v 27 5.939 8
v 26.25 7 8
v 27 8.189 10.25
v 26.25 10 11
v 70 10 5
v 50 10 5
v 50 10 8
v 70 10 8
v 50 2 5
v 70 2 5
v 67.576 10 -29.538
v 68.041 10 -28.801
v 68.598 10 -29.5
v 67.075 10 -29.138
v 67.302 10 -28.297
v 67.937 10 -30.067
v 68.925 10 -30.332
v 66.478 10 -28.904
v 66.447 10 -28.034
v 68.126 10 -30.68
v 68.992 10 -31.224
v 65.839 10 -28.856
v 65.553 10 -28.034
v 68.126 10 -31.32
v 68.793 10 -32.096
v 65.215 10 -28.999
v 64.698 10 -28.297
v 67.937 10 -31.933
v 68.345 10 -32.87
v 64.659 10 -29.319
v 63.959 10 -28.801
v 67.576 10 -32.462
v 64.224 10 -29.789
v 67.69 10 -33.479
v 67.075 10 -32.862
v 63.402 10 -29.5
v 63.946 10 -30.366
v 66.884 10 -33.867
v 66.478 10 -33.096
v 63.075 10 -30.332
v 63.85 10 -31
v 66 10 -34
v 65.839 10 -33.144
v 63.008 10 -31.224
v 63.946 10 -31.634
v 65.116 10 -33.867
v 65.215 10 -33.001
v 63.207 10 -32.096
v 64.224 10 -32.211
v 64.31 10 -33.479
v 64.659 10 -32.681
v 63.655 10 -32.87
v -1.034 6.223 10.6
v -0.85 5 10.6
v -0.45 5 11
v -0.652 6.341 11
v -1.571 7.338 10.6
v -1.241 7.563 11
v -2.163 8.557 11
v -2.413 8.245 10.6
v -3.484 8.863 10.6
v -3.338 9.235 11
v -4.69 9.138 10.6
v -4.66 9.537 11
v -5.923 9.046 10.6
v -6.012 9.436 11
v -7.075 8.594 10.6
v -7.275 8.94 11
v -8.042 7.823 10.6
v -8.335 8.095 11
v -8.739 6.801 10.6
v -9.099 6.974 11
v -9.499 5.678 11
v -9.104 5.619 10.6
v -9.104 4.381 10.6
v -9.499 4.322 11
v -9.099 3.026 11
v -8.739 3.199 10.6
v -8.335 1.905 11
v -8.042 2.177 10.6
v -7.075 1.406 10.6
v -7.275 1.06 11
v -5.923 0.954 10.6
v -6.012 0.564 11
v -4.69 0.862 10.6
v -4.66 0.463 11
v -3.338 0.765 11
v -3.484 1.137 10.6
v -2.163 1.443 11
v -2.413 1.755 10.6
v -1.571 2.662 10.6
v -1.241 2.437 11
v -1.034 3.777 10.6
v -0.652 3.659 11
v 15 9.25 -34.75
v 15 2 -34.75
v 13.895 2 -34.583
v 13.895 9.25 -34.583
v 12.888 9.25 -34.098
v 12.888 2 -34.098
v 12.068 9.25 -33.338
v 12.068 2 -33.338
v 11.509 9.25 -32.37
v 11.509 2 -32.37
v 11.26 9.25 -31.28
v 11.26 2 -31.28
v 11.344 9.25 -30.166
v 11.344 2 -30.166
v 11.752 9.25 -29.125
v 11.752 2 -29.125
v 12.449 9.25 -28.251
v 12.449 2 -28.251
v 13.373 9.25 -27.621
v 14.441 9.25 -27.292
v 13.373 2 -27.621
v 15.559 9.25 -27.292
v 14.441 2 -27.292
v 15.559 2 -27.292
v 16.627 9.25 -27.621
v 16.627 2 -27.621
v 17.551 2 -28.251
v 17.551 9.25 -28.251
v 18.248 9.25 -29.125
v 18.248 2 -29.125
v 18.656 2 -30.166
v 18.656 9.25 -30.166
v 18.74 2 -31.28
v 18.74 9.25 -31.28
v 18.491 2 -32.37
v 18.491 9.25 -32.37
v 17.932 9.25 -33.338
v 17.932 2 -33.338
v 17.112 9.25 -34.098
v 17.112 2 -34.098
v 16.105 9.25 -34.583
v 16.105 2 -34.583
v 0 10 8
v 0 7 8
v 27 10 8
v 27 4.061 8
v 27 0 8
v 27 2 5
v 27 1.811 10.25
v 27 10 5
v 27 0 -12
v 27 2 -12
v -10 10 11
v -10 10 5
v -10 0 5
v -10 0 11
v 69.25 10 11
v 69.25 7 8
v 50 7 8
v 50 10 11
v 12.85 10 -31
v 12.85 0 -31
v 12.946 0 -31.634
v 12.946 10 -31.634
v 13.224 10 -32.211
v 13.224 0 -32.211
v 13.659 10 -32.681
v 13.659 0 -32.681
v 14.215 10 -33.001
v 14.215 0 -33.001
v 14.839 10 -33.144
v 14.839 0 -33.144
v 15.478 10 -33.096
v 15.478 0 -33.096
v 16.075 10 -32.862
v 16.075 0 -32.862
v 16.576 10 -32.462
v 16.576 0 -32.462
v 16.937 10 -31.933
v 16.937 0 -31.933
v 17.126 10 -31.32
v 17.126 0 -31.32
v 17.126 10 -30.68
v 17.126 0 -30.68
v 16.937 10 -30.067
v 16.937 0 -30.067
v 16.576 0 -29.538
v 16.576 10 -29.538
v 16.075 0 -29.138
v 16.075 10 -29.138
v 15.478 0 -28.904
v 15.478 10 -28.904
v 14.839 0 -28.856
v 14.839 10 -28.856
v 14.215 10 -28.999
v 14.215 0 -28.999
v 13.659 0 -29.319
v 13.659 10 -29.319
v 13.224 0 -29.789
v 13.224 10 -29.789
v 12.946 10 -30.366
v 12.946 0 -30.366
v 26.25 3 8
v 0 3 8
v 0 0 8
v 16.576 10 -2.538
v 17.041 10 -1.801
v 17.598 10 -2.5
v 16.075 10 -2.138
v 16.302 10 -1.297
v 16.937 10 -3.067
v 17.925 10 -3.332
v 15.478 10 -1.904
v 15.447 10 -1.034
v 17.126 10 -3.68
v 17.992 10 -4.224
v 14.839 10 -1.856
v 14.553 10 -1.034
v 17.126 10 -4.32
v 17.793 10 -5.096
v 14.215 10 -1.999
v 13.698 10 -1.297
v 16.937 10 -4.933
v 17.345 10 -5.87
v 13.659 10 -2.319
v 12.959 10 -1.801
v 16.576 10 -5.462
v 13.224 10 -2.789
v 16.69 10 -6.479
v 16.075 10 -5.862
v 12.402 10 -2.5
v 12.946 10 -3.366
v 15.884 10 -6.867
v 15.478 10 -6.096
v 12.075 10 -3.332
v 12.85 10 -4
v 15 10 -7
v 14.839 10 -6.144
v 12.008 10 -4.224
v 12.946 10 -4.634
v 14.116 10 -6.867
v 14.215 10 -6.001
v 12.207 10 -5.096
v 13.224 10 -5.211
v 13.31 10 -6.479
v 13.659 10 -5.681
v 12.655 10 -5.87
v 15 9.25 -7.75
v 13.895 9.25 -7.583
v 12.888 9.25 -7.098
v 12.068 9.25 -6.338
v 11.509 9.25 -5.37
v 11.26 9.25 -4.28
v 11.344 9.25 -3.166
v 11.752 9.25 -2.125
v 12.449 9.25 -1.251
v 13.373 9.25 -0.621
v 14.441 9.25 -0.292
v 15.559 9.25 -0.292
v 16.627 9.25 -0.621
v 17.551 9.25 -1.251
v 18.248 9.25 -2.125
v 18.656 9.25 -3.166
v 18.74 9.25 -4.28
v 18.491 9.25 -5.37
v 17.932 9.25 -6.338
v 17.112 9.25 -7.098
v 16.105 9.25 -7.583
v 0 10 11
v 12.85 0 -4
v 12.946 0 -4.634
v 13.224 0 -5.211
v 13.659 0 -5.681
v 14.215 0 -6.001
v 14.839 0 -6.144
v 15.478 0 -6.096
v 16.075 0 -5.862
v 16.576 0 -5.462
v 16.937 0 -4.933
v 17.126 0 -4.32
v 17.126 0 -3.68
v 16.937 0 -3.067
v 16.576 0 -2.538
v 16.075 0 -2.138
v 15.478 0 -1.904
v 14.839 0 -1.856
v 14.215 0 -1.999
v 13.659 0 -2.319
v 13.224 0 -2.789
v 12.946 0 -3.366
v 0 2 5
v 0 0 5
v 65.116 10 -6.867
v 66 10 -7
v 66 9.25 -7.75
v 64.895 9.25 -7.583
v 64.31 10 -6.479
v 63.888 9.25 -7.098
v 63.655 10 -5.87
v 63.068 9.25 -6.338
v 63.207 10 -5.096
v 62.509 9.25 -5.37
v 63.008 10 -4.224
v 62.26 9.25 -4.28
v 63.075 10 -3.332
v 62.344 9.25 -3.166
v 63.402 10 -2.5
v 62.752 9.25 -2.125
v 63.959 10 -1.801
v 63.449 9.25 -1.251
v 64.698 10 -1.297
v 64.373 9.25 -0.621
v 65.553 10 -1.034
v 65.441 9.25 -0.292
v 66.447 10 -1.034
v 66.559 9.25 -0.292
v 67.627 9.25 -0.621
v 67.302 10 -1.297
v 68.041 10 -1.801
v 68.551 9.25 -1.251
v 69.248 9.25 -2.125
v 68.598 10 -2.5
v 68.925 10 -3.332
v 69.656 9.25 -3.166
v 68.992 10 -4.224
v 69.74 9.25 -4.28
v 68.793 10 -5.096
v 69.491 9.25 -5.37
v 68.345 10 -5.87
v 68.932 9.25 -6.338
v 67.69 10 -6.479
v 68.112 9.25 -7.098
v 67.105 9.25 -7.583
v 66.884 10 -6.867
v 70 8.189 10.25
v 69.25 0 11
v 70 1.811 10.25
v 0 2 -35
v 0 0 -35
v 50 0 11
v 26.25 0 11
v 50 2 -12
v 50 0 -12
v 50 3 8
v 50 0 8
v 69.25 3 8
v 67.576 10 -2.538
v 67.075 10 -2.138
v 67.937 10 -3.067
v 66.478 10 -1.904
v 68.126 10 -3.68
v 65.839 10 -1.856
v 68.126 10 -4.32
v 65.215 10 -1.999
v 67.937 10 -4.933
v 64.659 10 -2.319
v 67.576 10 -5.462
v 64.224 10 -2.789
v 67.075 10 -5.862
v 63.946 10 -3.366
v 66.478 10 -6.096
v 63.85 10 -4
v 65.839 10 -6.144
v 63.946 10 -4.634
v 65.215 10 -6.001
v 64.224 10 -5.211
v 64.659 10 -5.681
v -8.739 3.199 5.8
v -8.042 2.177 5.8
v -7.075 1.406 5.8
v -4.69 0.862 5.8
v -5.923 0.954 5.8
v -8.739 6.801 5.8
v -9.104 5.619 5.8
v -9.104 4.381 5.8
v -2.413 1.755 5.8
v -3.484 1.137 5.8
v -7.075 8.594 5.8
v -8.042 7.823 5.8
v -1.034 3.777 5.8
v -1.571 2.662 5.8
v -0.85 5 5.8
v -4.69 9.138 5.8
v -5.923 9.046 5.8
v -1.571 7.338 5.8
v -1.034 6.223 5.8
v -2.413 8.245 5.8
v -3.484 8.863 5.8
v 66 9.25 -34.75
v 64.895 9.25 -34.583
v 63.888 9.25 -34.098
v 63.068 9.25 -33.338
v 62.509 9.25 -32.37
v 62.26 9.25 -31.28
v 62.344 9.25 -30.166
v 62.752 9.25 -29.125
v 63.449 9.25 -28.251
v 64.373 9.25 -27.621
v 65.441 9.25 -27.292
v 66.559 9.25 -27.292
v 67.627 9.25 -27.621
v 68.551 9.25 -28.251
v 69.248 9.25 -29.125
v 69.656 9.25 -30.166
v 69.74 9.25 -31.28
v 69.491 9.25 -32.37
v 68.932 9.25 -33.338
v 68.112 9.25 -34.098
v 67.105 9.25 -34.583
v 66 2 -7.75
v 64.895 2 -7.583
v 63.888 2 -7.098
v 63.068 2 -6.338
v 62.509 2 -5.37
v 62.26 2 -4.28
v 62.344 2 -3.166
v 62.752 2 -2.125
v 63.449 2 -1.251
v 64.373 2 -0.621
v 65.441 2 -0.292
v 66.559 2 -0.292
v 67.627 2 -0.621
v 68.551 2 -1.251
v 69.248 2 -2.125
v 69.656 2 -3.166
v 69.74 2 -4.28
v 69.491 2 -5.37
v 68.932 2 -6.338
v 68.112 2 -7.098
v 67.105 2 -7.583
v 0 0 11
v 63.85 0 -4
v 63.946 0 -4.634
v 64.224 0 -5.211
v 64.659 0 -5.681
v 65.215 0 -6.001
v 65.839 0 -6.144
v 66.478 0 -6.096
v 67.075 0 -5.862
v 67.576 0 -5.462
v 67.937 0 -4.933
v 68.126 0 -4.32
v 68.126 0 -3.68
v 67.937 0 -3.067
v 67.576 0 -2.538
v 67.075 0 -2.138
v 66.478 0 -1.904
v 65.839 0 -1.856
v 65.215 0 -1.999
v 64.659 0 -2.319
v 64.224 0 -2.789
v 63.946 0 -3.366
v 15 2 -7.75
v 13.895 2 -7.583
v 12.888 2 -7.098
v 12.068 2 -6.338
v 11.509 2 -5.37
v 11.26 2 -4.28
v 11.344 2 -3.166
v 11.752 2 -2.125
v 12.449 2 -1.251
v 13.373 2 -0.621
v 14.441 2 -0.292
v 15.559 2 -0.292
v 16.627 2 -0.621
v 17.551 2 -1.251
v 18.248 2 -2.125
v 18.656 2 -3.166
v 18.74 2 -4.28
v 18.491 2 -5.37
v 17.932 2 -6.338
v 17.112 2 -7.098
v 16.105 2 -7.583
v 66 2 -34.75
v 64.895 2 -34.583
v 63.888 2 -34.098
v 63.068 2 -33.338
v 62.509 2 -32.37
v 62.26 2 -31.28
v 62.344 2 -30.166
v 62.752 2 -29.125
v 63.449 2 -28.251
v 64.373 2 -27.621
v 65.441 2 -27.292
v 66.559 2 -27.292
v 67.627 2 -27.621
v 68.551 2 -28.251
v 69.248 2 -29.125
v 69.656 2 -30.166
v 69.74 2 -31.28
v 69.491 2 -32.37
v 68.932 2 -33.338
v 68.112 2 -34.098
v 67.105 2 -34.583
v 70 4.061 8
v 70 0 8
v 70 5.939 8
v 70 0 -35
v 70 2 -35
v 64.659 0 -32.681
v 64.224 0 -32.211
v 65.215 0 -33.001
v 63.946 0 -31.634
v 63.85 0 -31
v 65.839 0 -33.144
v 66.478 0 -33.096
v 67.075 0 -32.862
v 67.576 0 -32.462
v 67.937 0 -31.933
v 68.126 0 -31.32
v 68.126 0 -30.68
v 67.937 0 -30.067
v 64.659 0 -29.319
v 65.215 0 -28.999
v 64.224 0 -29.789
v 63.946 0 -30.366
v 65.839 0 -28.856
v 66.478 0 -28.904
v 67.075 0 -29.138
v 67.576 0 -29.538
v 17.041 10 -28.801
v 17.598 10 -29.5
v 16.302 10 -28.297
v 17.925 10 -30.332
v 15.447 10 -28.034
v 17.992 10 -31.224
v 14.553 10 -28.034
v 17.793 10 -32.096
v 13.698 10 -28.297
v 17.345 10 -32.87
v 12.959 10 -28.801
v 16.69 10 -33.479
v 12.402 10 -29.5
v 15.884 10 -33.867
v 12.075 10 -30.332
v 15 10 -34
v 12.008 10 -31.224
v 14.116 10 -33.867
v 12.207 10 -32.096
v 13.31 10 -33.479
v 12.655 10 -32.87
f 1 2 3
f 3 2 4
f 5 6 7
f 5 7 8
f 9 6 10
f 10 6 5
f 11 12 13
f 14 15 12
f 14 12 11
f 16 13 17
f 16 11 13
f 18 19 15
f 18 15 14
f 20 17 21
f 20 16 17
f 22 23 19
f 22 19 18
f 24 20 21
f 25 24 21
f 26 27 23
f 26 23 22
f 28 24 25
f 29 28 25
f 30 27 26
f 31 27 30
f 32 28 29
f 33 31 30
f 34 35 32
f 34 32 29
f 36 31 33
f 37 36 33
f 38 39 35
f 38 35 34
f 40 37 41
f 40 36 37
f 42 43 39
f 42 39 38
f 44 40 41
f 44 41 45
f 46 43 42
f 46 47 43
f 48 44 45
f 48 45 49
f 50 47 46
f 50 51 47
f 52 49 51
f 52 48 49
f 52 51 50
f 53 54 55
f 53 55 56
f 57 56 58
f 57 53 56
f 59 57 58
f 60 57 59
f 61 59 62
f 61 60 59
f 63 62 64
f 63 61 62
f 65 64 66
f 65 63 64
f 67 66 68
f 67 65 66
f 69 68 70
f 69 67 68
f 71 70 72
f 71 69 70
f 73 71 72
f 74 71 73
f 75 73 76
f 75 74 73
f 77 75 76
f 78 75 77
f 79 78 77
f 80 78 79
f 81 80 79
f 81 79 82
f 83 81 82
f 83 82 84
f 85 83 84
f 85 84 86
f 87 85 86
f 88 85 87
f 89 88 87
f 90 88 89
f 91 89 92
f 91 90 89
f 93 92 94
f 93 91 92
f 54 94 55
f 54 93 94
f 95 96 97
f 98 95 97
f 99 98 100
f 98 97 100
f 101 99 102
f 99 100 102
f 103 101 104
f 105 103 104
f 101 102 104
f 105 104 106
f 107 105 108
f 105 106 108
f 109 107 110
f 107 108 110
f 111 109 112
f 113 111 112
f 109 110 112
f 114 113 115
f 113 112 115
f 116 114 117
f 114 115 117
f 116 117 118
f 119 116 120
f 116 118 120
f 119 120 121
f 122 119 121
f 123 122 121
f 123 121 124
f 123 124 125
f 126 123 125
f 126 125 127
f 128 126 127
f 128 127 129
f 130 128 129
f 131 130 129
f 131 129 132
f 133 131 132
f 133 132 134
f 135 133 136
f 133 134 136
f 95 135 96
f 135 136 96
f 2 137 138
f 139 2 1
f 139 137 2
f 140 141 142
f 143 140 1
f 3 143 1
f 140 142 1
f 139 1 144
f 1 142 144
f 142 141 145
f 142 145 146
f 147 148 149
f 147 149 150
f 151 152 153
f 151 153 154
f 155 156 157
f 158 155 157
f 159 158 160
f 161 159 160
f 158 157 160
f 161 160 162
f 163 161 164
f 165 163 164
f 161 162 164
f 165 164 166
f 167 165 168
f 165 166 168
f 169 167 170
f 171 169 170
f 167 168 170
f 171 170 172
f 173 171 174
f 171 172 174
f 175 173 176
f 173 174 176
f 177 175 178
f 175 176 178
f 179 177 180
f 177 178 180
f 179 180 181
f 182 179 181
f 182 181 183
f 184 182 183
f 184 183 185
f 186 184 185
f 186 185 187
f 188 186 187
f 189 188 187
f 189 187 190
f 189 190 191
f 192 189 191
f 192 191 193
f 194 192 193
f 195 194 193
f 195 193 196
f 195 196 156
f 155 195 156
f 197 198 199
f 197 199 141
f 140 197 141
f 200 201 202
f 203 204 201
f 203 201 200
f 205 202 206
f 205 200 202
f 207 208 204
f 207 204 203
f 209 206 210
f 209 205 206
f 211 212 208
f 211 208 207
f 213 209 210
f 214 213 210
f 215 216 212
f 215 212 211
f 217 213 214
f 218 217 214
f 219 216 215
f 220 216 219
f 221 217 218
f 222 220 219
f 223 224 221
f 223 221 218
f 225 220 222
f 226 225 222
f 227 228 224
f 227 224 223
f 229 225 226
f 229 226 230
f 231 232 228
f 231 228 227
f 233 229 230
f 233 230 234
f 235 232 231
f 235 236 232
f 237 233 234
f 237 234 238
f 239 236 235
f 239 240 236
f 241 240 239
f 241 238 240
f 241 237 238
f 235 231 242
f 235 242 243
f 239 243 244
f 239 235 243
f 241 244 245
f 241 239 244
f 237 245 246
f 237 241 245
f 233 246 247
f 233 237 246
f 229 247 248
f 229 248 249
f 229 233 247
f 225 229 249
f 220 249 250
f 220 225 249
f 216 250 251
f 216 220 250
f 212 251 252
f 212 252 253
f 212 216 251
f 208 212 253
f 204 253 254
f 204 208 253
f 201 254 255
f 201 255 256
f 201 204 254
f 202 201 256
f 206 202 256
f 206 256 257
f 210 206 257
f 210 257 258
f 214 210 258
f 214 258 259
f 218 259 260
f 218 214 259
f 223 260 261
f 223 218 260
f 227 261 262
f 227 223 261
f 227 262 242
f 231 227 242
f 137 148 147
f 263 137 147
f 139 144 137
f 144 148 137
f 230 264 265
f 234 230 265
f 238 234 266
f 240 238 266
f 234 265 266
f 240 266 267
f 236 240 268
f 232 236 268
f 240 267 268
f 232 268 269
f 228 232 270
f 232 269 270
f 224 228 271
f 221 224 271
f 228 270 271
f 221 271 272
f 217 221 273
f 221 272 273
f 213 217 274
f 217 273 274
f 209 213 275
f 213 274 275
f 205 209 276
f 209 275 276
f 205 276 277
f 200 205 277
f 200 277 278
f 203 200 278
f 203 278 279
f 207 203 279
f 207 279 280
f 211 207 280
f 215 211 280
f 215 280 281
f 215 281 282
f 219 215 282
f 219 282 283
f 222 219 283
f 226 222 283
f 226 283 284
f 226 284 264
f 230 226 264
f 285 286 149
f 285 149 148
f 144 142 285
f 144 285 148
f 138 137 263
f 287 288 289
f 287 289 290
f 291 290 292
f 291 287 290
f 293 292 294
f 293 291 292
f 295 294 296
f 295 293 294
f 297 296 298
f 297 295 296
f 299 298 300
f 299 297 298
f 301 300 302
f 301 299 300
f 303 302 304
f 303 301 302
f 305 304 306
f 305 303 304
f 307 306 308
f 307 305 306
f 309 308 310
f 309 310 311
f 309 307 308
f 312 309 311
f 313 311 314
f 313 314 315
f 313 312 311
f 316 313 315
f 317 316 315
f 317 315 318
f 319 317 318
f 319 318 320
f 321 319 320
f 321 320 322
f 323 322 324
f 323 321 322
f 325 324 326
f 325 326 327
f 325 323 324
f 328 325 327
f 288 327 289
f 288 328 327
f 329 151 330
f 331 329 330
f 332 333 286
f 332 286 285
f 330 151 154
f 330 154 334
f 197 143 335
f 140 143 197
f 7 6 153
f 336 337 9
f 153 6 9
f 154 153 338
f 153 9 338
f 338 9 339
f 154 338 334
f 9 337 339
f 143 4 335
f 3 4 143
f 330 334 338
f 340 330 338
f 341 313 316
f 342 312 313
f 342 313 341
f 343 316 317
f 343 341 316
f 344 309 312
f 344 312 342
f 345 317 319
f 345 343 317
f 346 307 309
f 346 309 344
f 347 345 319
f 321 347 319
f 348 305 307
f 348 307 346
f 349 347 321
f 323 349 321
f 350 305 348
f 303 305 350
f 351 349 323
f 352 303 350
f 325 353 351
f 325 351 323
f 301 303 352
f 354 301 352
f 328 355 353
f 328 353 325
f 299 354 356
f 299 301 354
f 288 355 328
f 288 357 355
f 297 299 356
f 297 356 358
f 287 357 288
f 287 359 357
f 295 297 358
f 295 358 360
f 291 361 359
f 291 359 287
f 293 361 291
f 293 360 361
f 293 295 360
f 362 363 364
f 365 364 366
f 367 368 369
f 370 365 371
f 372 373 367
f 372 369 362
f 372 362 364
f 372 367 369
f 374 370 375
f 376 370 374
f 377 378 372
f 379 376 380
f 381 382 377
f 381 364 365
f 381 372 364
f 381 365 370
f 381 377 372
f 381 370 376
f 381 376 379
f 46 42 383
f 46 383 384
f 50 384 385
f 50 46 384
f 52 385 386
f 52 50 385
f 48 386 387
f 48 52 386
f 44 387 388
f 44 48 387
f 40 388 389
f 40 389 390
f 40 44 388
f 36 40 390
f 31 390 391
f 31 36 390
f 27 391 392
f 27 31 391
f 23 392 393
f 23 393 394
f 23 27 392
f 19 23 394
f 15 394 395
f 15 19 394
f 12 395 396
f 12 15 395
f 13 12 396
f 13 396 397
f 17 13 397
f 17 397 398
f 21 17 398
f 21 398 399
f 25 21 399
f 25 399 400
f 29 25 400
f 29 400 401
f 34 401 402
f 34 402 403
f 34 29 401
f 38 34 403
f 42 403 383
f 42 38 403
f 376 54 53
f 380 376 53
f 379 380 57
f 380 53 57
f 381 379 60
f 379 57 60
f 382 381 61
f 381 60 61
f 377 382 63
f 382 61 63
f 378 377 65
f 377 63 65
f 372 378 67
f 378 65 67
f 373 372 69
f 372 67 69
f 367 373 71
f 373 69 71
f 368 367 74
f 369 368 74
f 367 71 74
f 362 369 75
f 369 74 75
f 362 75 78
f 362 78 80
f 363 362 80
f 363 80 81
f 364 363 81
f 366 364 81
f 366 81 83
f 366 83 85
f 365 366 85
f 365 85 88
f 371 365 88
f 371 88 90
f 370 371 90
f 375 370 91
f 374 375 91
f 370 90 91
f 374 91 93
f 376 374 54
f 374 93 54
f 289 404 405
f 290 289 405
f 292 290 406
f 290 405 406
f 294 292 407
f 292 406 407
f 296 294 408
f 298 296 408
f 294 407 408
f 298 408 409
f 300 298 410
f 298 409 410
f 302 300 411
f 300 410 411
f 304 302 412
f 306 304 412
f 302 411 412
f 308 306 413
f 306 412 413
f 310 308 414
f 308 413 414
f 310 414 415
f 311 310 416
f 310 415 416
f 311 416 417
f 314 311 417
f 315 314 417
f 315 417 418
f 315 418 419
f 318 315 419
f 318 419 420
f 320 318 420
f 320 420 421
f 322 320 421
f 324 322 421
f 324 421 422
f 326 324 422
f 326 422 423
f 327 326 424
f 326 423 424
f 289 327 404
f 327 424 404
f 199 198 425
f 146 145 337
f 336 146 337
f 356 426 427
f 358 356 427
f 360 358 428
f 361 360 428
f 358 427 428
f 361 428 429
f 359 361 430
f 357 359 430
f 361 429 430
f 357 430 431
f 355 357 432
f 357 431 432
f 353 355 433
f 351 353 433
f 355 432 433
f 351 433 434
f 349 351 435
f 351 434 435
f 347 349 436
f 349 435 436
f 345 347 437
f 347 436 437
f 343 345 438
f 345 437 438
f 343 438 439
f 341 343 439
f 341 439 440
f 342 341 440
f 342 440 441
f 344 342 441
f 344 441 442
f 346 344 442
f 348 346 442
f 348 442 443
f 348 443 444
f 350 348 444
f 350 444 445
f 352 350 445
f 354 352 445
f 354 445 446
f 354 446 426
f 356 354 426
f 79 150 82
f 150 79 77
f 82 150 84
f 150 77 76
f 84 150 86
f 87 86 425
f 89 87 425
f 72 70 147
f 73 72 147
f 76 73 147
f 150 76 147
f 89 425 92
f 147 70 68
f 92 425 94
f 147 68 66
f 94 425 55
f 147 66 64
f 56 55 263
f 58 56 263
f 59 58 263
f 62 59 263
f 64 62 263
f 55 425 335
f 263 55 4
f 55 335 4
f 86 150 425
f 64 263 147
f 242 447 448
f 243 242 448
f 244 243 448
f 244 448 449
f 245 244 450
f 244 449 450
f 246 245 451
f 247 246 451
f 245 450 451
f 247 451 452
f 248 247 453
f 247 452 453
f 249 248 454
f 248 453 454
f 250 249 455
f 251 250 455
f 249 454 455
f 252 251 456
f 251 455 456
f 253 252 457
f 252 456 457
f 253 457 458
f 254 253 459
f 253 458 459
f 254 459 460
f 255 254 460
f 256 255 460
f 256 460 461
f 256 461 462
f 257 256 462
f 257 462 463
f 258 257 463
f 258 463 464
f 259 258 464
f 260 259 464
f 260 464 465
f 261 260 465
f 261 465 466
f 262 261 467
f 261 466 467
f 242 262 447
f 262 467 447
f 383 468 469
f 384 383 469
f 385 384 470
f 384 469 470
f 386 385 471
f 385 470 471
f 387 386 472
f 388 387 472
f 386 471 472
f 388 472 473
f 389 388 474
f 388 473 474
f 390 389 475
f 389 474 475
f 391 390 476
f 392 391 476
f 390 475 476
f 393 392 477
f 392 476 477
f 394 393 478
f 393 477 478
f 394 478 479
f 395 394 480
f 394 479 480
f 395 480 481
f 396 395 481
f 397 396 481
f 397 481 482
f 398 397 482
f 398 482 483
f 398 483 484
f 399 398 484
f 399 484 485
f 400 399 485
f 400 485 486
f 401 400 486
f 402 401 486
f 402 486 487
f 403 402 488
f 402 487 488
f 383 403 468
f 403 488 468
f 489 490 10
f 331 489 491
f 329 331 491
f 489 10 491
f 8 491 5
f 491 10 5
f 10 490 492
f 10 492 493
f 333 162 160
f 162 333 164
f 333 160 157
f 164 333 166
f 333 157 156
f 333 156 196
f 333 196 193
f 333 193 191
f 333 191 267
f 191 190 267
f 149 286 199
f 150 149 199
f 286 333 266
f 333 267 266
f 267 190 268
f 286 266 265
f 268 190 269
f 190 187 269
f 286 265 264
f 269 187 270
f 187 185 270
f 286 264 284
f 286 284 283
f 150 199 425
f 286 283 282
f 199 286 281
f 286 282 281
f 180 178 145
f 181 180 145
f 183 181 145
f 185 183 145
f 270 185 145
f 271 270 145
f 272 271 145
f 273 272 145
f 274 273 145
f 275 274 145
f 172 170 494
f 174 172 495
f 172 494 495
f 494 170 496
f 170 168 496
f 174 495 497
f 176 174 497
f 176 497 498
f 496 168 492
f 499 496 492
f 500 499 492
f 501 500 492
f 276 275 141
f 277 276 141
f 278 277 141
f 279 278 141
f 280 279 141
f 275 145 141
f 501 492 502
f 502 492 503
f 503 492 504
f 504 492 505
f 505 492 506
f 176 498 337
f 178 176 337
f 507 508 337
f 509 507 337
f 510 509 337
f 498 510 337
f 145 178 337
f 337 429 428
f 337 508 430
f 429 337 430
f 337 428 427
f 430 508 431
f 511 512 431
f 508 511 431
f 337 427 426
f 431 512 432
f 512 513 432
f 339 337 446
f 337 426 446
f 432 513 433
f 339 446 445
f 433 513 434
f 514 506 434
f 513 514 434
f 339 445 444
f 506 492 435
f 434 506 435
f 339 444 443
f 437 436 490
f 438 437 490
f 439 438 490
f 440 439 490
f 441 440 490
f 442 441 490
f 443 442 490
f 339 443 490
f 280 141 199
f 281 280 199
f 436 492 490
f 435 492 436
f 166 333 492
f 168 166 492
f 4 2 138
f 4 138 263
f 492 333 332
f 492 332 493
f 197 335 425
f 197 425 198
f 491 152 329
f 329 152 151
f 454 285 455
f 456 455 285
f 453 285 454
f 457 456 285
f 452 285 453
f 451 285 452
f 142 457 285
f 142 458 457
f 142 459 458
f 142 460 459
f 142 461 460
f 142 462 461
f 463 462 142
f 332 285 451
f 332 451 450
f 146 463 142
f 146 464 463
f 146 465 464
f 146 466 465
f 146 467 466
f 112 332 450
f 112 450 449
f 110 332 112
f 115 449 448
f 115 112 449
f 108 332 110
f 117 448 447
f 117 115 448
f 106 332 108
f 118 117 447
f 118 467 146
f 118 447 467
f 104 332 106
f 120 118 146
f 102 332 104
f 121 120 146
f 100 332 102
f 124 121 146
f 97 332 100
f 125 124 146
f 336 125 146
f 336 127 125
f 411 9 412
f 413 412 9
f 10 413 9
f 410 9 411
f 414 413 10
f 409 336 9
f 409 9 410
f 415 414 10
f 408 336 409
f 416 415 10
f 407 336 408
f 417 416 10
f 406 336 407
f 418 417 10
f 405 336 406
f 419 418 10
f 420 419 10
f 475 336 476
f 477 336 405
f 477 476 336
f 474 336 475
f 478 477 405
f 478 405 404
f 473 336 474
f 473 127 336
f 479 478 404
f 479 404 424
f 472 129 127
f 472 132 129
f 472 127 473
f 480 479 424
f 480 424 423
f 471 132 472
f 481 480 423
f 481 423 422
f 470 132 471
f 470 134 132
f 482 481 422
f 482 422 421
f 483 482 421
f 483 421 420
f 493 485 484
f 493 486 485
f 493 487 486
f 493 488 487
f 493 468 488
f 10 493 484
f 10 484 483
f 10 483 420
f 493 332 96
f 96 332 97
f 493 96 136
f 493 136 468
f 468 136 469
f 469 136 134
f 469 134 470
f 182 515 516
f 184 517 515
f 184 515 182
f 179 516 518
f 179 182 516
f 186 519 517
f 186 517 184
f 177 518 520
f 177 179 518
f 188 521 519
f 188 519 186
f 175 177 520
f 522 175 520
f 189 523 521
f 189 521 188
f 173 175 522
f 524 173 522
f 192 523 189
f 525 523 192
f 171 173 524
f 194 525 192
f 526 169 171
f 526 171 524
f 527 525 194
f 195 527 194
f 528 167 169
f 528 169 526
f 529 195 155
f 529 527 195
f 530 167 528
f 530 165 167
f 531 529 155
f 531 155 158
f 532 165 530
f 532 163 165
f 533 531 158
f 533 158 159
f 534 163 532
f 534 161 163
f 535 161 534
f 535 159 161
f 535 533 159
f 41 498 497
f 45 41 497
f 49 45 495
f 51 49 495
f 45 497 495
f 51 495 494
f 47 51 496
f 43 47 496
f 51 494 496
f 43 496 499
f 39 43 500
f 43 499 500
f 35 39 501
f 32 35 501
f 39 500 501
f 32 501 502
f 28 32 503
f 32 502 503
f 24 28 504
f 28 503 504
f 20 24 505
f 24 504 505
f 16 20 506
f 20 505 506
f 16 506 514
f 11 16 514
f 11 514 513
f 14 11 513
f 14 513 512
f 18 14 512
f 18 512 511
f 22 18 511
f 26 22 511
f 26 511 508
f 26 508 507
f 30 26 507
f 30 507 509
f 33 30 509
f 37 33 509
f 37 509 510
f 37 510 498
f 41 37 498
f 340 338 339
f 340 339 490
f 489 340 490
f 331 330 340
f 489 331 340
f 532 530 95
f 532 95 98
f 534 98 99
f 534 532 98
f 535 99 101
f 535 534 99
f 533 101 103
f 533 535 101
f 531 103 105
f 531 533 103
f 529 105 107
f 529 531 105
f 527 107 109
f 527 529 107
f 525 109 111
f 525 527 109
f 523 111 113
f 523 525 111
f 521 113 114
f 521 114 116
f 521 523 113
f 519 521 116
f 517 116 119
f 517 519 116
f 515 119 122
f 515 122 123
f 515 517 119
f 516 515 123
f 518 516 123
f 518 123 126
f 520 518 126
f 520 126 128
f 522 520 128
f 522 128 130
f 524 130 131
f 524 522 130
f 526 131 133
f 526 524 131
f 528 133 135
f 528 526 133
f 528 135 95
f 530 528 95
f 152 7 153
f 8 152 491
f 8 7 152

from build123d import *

# Parameters (mm, degrees)
SKETCH1_W                  = 70
SKETCH1_H                  = 35
BOSS_EXTRUDE1_DEPTH        = 2
SKETCH2_R                  = 3.75
BOSS_EXTRUDE2_DEPTH        = 8
SKETCH6_W                  = 70
SKETCH6_H                  = 2
BOSS_EXTRUDE3_DEPTH        = 2
F_4_3_4_3_DIAMETER_HOLE1_D = 4.3
CHAMFER1_SIZE              = 0.75
SKETCH5_W                  = 23
SKETCH5_H                  = 14
CUT_EXTRUDE1_DEPTH         = 79.89866919
SKETCH7_W                  = 27
SKETCH7_H                  = 2
SKETCH7_W_2                = 20
BOSS_EXTRUDE4_DEPTH        = 3
SKETCH9_W                  = 27
SKETCH9_H                  = 10
SKETCH9_W_2                = 20
BOSS_EXTRUDE5_DEPTH        = 3
BOSS_EXTRUDE6_DEPTH        = 20
BOSS_EXTRUDE7_START        = -43
BOSS_EXTRUDE7_DEPTH        = 27
CHAMFER3_SIZE              = 0.75
SKETCH11_W                 = 6
SKETCH11_H                 = 10
BOSS_EXTRUDE8_DEPTH        = 10
SKETCH12_R                 = 4.15
CUT_EXTRUDE2_DEPTH         = 5.2
CHAMFER4_SIZE              = 0.4


with BuildPart() as part:
    # Sketch1 → Boss-Extrude1 (new body)
    with BuildSketch(Plane(origin=(0, 0, 0), x_dir=(1, 0, 0), z_dir=(0, 1, 0))):
        with Locations((35, 17.5)):
            Rectangle(SKETCH1_W, SKETCH1_H)
    extrude(amount=BOSS_EXTRUDE1_DEPTH)

    # Sketch2 → Boss-Extrude2 (add)
    with BuildSketch(Plane(origin=(0, 2, 0), x_dir=(1, 0, 0), z_dir=(0, 1, 0))):
        with Locations(Location((66, 31, 0), (0, 0, 90))):
            Circle(SKETCH2_R)
        with Locations(Location((15, 31, 0), (0, 0, 90))):
            Circle(SKETCH2_R)
        with Locations(Location((15, 4, 0), (0, 0, 90))):
            Circle(SKETCH2_R)
        with Locations(Location((66, 4, 0), (0, 0, 90))):
            Circle(SKETCH2_R)
    extrude(amount=BOSS_EXTRUDE2_DEPTH)

    # Sketch6 → Boss-Extrude3 (add)
    with BuildSketch(Plane.XY):
        with Locations((35, 1)):
            Rectangle(SKETCH6_W, SKETCH6_H)
    extrude(amount=BOSS_EXTRUDE3_DEPTH)

    # Ø4.3 (4.3) Diameter Hole1 (through all)
    with Locations(Plane(origin=(0, 10, 0), x_dir=(1, 0, 0), z_dir=(0, 1, 0))):
        with Locations((66, 31), (15, 31), (15, 4), (66, 4)):
            Hole(F_4_3_4_3_DIAMETER_HOLE1_D / 2)

    # Chamfer1
    chamfer1_edges = [part.edges().sort_by_distance(p)[0] for p in [
        (66, 10, -27.25),
        (15, 10, -27.25),
        (15, 10, -0.25),
        (66, 10, -0.25),
    ]]
    chamfer(chamfer1_edges, length=CHAMFER1_SIZE)

    # Sketch5 → Cut-Extrude1 (cut, through all)
    with BuildSketch(Plane.XZ):
        with Locations((38.5, -5)):
            Rectangle(SKETCH5_W, SKETCH5_H)
    extrude(amount=-CUT_EXTRUDE1_DEPTH, mode=Mode.SUBTRACT)

    # Sketch7 → Boss-Extrude4 (add)
    with BuildSketch(Plane.XY.offset(2)):
        with Locations((13.5, 1)):
            Rectangle(SKETCH7_W, SKETCH7_H)
        with Locations((60, 1)):
            Rectangle(SKETCH7_W_2, SKETCH7_H)
    extrude(amount=BOSS_EXTRUDE4_DEPTH)

    # Sketch9 → Boss-Extrude5 (add)
    with BuildSketch(Plane.XY.offset(5)):
        with Locations((13.5, 5)):
            Rectangle(SKETCH9_W, SKETCH9_H)
        with Locations((60, 5)):
            Rectangle(SKETCH9_W_2, SKETCH9_H)
    extrude(amount=BOSS_EXTRUDE5_DEPTH)

    # Sketch10 → Boss-Extrude6 (add)
    with BuildSketch(Plane(origin=(70, 0, 0), x_dir=(0, 0, -1), z_dir=(1, 0, 0))):
        Polygon((-8, 7), (-11, 10), (-11, 0), (-8, 3), align=None)
    extrude(amount=-BOSS_EXTRUDE6_DEPTH)

    # Sketch10<2> → Boss-Extrude7 (add)
    with BuildSketch(Plane(origin=(70, 0, 0), x_dir=(0, 0, -1), z_dir=(1, 0, 0)).offset(BOSS_EXTRUDE7_START)):
        Polygon((-8, 7), (-11, 10), (-11, 0), (-8, 3), align=None)
    extrude(amount=-BOSS_EXTRUDE7_DEPTH)

    # Chamfer3
    chamfer3_edges = [part.edges().sort_by_distance(p)[0] for p in [
        (70, 8.5, 9.5),
        (70, 5, 11),
        (70, 1.5, 9.5),
        (27, 8.5, 9.5),
        (27, 5, 11),
        (27, 1.5, 9.5),
    ]]
    chamfer(chamfer3_edges, length=CHAMFER3_SIZE)

    # Sketch11 → Boss-Extrude8 (add)
    with BuildSketch(Plane.ZY):
        with Locations((8, 5)):
            Rectangle(SKETCH11_W, SKETCH11_H)
    extrude(amount=BOSS_EXTRUDE8_DEPTH)

    # Sketch12 → Cut-Extrude2 (cut)
    with BuildSketch(Plane.XY.offset(11)):
        with Locations((-5, 5)):
            Circle(SKETCH12_R)
    extrude(amount=-CUT_EXTRUDE2_DEPTH, mode=Mode.SUBTRACT)

    # Chamfer4
    chamfer4_edges = [part.edges().sort_by_distance(p)[0] for p in [
        (-9.15, 5, 11),
    ]]
    chamfer(chamfer4_edges, length=CHAMFER4_SIZE)


solid = part.part
